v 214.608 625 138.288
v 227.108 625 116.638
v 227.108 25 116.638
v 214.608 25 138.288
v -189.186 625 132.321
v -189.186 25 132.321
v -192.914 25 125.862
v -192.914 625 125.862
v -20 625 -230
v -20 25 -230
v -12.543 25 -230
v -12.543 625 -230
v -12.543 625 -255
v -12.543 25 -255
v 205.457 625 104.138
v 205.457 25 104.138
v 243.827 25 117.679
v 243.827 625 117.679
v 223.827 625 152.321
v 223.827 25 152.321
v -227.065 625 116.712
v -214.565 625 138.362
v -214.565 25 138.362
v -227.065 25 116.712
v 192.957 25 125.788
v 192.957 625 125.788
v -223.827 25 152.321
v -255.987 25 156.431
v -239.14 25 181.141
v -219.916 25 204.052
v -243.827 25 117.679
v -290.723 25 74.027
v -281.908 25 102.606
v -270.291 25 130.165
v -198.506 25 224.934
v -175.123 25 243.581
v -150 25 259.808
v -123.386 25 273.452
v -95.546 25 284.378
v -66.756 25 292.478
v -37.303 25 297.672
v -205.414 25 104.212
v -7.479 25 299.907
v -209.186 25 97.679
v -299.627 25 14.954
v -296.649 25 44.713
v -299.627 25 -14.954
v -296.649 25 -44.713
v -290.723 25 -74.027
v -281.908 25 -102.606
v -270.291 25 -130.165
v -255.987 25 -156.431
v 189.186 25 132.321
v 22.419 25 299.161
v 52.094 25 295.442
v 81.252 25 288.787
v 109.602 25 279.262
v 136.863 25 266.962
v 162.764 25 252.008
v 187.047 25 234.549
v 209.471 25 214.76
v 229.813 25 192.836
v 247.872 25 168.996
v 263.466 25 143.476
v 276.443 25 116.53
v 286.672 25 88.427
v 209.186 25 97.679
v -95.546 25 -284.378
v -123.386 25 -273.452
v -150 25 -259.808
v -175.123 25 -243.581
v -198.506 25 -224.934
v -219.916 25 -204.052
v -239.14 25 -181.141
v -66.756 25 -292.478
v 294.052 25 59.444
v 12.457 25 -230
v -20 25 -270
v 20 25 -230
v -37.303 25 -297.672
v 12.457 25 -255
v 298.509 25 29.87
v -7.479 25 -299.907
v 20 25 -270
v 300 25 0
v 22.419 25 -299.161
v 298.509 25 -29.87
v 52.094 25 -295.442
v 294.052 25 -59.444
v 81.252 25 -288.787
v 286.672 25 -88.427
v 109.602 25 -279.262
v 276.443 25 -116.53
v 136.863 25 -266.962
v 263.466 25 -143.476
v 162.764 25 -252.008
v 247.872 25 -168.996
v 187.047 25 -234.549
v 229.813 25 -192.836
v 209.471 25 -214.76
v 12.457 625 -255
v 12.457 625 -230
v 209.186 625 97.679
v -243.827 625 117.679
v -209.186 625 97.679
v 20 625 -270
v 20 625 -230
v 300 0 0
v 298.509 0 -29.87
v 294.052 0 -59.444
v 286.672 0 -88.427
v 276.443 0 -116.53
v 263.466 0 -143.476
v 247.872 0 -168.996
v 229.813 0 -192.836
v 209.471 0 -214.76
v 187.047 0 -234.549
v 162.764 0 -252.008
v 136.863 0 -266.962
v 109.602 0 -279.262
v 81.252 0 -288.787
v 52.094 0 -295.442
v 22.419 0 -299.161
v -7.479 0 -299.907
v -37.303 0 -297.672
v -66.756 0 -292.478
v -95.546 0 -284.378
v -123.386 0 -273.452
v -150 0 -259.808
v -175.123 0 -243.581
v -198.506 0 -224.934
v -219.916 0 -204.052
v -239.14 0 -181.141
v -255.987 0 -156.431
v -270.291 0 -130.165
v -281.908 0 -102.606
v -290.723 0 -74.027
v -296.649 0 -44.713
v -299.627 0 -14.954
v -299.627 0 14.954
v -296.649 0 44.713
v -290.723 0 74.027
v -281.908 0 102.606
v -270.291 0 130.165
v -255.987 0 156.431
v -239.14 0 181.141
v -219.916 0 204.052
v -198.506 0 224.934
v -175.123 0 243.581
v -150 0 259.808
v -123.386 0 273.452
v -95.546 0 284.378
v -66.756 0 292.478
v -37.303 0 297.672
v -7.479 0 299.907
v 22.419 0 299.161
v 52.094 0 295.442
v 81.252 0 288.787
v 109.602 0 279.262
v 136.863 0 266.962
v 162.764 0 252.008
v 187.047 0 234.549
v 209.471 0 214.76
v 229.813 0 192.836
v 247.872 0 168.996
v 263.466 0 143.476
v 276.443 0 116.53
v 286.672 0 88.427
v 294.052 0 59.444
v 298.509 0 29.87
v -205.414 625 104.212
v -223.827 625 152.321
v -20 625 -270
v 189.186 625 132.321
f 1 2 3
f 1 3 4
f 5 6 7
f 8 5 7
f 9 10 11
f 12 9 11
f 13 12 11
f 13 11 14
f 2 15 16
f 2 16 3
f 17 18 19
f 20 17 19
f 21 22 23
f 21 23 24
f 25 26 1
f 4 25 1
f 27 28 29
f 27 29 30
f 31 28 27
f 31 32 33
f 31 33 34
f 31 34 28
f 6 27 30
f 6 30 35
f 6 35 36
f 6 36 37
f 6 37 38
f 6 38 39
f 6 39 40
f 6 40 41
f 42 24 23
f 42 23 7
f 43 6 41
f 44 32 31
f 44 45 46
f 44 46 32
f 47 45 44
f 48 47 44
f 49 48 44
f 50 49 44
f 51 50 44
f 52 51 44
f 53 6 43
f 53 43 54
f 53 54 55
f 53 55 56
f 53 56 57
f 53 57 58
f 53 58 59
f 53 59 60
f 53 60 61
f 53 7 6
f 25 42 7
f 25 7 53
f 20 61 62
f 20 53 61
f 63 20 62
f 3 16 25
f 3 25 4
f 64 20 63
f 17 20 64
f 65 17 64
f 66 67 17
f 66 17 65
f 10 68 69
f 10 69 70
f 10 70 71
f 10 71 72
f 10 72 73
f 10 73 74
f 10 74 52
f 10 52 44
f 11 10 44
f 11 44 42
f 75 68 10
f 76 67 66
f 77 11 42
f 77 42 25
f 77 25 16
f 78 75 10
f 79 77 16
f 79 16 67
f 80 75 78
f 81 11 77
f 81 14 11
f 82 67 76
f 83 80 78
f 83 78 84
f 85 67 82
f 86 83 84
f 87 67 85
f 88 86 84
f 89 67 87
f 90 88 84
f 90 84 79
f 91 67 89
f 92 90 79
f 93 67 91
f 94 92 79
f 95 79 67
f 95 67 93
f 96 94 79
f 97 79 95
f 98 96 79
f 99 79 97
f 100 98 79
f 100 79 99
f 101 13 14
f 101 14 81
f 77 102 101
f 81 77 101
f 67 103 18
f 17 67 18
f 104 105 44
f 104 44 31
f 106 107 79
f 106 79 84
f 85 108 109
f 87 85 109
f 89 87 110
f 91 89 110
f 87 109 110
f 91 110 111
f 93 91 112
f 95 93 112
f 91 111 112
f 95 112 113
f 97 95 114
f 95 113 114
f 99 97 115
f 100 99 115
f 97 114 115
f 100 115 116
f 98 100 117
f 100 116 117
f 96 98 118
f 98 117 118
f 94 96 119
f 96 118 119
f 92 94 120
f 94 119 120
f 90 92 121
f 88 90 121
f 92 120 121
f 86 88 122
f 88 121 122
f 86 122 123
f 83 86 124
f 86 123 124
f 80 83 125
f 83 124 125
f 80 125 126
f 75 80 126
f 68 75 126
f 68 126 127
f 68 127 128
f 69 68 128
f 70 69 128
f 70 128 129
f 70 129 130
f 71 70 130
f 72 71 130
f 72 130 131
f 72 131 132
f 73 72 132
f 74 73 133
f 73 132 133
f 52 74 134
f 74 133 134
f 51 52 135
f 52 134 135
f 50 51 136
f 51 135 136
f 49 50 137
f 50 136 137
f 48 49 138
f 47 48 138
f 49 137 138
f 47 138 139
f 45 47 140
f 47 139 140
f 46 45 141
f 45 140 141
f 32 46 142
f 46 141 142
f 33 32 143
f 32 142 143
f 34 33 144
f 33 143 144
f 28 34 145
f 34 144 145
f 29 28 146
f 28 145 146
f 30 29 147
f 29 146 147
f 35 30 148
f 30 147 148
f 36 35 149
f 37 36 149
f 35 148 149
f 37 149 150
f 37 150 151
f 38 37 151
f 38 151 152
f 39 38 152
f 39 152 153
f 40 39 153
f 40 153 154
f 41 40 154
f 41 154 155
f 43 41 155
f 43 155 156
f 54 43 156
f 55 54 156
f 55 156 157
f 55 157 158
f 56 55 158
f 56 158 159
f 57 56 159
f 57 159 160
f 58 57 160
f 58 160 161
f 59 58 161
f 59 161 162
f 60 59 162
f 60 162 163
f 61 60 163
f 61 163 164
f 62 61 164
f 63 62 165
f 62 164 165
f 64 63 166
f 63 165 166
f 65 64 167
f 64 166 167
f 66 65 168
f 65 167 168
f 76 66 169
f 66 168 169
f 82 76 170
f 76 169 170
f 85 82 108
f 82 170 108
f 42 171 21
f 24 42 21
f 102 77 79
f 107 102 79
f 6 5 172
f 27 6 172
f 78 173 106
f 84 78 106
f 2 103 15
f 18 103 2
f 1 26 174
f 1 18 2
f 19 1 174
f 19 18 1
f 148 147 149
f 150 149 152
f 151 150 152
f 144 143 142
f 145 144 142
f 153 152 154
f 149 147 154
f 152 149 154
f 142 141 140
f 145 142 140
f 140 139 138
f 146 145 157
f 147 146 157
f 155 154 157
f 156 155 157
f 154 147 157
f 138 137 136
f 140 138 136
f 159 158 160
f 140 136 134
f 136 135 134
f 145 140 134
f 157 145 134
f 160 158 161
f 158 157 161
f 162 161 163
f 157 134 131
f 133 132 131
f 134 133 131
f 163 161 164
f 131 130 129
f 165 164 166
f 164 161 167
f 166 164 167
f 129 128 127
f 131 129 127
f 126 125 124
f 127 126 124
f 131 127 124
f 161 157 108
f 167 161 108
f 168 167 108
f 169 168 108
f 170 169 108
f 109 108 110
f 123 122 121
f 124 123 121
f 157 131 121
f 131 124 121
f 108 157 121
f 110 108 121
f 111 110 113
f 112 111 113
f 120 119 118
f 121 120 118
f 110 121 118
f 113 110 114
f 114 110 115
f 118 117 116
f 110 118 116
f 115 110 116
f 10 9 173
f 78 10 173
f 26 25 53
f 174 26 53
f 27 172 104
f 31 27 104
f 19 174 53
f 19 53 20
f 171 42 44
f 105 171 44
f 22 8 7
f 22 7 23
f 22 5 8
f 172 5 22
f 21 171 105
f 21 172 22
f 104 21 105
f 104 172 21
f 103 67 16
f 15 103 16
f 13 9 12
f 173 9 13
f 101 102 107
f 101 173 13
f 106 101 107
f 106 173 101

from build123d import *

# Parameters (mm, degrees)
SKETCH2_R           = 300
BOSS_EXTRUDE1_DEPTH = 25
SKETCH4_W           = 40
SKETCH4_H           = 40
BOSS_EXTRUDE2_DEPTH = 600
SKETCH5_W           = 25
SKETCH5_H           = 25
CUT_EXTRUDE3_DEPTH  = 600
CIRPATTERN2_COUNT   = 3


with BuildPart() as part:
    # Sketch2 → Boss-Extrude1 (new body)
    with BuildSketch(Plane(origin=(0, 0, 0), x_dir=(1, 0, 0), z_dir=(0, 1, 0))):
        Circle(SKETCH2_R)
    extrude(amount=BOSS_EXTRUDE1_DEPTH)

    # Sketch4 → Boss-Extrude2 (add)
    with BuildSketch(Plane(origin=(0, 25, 0), x_dir=(1, 0, 0), z_dir=(0, 1, 0))):
        with Locations((0, 250)):
            Rectangle(SKETCH4_W, SKETCH4_H)
    boss_extrude2 = extrude(amount=BOSS_EXTRUDE2_DEPTH)

    # Sketch5 → Cut-Extrude3 (cut)
    with BuildSketch(Plane(origin=(0, 625, 0), x_dir=(1, 0, 0), z_dir=(0, 1, 0))):
        with Locations((-0.042882398, 242.5)):
            Rectangle(SKETCH5_W, SKETCH5_H)
    cut_extrude3 = extrude(amount=-CUT_EXTRUDE3_DEPTH, mode=Mode.SUBTRACT)

    # CirPattern2: Boss-Extrude2, Cut-Extrude3 ×3 about axis
    cirpattern2_axis = Axis((0, 0, 0), (0, 1, 0))
    for i in range(1, CIRPATTERN2_COUNT):
        add(boss_extrude2.rotate(cirpattern2_axis, i * 360 / CIRPATTERN2_COUNT))
        add(cut_extrude3.rotate(cirpattern2_axis, i * 360 / CIRPATTERN2_COUNT), mode=Mode.SUBTRACT)


solid = part.part
